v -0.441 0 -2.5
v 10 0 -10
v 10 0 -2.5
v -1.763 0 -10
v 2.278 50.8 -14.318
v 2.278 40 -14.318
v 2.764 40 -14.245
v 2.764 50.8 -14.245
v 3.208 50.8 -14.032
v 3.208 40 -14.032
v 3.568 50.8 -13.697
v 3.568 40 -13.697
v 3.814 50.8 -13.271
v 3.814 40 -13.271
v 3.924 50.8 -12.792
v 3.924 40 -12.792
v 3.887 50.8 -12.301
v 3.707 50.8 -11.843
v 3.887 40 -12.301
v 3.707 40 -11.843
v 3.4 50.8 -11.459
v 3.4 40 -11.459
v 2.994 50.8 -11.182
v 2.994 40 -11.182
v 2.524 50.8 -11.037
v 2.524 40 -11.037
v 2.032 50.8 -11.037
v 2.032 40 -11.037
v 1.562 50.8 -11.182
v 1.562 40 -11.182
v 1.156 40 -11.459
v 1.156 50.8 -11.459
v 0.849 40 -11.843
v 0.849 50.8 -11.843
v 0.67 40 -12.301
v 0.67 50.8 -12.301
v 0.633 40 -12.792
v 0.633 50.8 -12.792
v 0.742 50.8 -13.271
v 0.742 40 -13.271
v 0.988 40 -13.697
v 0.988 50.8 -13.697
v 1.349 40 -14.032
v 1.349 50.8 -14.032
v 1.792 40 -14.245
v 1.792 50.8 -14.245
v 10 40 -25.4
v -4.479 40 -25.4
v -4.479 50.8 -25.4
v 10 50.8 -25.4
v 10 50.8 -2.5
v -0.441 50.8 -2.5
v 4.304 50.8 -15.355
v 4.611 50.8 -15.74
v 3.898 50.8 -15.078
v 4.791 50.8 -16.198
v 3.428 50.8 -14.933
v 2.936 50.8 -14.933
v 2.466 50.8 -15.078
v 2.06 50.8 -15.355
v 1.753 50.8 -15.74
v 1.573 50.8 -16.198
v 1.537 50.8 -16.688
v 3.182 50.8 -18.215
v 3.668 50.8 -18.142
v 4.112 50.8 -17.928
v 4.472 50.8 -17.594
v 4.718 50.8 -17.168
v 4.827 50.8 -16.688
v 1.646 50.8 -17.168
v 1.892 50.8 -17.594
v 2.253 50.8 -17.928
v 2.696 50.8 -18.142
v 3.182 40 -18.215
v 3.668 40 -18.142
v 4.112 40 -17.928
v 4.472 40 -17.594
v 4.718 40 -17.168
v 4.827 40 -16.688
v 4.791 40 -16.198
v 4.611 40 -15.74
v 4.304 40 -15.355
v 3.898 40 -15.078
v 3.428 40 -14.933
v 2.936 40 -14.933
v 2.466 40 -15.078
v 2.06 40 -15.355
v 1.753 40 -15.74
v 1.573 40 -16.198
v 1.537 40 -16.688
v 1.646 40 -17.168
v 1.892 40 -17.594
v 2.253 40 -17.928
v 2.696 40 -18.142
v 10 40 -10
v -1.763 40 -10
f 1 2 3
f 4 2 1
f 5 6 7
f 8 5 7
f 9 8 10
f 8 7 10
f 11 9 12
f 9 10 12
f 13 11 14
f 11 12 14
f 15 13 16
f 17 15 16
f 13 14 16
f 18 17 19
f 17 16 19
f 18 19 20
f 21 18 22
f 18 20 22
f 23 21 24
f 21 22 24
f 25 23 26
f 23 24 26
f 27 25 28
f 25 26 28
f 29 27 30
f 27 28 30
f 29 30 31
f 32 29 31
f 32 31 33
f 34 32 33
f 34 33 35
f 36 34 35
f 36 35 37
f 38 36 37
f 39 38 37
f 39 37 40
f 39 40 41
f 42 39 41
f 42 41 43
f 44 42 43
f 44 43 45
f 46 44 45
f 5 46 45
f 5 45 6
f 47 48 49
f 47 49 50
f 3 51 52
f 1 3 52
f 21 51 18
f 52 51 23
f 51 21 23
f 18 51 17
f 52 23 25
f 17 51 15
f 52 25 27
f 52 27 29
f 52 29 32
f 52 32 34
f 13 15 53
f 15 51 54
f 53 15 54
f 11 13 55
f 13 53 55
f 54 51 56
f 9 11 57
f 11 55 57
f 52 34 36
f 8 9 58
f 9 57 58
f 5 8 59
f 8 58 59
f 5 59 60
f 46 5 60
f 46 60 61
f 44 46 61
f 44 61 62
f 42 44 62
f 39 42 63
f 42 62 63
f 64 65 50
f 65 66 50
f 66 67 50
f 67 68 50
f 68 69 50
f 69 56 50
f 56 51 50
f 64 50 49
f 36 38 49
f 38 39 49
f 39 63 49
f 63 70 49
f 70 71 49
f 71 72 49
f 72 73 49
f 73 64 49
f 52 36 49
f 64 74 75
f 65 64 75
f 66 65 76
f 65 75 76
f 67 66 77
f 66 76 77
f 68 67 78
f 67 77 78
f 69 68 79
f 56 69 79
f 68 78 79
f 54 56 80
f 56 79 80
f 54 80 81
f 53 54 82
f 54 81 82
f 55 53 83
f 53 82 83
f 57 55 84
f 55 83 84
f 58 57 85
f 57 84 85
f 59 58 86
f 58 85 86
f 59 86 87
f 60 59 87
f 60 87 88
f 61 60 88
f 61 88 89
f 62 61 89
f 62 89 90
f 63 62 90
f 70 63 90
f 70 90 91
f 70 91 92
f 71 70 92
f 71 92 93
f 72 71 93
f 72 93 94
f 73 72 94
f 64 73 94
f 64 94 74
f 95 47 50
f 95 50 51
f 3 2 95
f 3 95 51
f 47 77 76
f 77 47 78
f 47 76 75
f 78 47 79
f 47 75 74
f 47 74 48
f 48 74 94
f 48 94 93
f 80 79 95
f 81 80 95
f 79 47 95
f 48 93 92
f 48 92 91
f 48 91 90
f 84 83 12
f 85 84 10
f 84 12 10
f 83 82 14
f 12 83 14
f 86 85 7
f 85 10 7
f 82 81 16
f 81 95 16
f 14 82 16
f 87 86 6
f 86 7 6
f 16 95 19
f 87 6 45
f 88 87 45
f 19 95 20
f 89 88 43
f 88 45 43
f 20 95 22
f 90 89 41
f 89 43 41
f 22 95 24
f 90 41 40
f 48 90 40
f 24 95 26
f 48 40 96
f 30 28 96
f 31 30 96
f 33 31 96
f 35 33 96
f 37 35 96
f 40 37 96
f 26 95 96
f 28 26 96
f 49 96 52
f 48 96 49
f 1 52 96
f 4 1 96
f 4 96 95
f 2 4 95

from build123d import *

# Parameters (mm, degrees)
BOSS_EXTRUDE1_DEPTH = 50.8
CUT_EXTRUDE1_DEPTH  = 40
CUT_EXTRUDE2_DEPTH  = 50.8
SKETCH4_R           = 1.65
CUT_EXTRUDE3_DEPTH  = 25.4


with BuildPart() as part:
    # Sketch1 → Boss-Extrude1 (new body)
    with BuildSketch(Plane(origin=(0, 0, 0), x_dir=(1, 0, 0), z_dir=(0, 1, 0))):
        Polygon((0, 0), (-4.47870531, 25.4), (10, 25.4), (10, 0), align=None)
    extrude(amount=BOSS_EXTRUDE1_DEPTH)

    # Sketch2 → Cut-Extrude1 (cut)
    with BuildSketch(Plane.XZ):
        Polygon((10, -25.4), (-4.47870531, -25.4), (-1.763269807, -10), (10, -10), align=None)
    extrude(amount=-CUT_EXTRUDE1_DEPTH, mode=Mode.SUBTRACT)

    # Sketch3 → Cut-Extrude2 (cut)
    with BuildSketch(Plane(origin=(0, 0, 0), x_dir=(-1, 0, 0), z_dir=(0, -1, 0))):
        Polygon((-10, 2.5), (0.440817452, 2.5), (0, 0), (-10, 0), align=None)
    extrude(amount=-CUT_EXTRUDE2_DEPTH, mode=Mode.SUBTRACT)

    # Sketch4 → Cut-Extrude3 (cut)
    with BuildSketch(Plane(origin=(0, 40, 0), x_dir=(-1, 0, 0), z_dir=(0, -1, 0))):
        with Locations(Location((-3.18210765, 16.56485457, 0), (0, 0, 90))):
            Circle(SKETCH4_R)
        with Locations(Location((-2.278142793, 12.66833721, 0), (0, 0, 90))):
            Circle(SKETCH4_R)
    extrude(amount=-CUT_EXTRUDE3_DEPTH, mode=Mode.SUBTRACT)


solid = part.part
